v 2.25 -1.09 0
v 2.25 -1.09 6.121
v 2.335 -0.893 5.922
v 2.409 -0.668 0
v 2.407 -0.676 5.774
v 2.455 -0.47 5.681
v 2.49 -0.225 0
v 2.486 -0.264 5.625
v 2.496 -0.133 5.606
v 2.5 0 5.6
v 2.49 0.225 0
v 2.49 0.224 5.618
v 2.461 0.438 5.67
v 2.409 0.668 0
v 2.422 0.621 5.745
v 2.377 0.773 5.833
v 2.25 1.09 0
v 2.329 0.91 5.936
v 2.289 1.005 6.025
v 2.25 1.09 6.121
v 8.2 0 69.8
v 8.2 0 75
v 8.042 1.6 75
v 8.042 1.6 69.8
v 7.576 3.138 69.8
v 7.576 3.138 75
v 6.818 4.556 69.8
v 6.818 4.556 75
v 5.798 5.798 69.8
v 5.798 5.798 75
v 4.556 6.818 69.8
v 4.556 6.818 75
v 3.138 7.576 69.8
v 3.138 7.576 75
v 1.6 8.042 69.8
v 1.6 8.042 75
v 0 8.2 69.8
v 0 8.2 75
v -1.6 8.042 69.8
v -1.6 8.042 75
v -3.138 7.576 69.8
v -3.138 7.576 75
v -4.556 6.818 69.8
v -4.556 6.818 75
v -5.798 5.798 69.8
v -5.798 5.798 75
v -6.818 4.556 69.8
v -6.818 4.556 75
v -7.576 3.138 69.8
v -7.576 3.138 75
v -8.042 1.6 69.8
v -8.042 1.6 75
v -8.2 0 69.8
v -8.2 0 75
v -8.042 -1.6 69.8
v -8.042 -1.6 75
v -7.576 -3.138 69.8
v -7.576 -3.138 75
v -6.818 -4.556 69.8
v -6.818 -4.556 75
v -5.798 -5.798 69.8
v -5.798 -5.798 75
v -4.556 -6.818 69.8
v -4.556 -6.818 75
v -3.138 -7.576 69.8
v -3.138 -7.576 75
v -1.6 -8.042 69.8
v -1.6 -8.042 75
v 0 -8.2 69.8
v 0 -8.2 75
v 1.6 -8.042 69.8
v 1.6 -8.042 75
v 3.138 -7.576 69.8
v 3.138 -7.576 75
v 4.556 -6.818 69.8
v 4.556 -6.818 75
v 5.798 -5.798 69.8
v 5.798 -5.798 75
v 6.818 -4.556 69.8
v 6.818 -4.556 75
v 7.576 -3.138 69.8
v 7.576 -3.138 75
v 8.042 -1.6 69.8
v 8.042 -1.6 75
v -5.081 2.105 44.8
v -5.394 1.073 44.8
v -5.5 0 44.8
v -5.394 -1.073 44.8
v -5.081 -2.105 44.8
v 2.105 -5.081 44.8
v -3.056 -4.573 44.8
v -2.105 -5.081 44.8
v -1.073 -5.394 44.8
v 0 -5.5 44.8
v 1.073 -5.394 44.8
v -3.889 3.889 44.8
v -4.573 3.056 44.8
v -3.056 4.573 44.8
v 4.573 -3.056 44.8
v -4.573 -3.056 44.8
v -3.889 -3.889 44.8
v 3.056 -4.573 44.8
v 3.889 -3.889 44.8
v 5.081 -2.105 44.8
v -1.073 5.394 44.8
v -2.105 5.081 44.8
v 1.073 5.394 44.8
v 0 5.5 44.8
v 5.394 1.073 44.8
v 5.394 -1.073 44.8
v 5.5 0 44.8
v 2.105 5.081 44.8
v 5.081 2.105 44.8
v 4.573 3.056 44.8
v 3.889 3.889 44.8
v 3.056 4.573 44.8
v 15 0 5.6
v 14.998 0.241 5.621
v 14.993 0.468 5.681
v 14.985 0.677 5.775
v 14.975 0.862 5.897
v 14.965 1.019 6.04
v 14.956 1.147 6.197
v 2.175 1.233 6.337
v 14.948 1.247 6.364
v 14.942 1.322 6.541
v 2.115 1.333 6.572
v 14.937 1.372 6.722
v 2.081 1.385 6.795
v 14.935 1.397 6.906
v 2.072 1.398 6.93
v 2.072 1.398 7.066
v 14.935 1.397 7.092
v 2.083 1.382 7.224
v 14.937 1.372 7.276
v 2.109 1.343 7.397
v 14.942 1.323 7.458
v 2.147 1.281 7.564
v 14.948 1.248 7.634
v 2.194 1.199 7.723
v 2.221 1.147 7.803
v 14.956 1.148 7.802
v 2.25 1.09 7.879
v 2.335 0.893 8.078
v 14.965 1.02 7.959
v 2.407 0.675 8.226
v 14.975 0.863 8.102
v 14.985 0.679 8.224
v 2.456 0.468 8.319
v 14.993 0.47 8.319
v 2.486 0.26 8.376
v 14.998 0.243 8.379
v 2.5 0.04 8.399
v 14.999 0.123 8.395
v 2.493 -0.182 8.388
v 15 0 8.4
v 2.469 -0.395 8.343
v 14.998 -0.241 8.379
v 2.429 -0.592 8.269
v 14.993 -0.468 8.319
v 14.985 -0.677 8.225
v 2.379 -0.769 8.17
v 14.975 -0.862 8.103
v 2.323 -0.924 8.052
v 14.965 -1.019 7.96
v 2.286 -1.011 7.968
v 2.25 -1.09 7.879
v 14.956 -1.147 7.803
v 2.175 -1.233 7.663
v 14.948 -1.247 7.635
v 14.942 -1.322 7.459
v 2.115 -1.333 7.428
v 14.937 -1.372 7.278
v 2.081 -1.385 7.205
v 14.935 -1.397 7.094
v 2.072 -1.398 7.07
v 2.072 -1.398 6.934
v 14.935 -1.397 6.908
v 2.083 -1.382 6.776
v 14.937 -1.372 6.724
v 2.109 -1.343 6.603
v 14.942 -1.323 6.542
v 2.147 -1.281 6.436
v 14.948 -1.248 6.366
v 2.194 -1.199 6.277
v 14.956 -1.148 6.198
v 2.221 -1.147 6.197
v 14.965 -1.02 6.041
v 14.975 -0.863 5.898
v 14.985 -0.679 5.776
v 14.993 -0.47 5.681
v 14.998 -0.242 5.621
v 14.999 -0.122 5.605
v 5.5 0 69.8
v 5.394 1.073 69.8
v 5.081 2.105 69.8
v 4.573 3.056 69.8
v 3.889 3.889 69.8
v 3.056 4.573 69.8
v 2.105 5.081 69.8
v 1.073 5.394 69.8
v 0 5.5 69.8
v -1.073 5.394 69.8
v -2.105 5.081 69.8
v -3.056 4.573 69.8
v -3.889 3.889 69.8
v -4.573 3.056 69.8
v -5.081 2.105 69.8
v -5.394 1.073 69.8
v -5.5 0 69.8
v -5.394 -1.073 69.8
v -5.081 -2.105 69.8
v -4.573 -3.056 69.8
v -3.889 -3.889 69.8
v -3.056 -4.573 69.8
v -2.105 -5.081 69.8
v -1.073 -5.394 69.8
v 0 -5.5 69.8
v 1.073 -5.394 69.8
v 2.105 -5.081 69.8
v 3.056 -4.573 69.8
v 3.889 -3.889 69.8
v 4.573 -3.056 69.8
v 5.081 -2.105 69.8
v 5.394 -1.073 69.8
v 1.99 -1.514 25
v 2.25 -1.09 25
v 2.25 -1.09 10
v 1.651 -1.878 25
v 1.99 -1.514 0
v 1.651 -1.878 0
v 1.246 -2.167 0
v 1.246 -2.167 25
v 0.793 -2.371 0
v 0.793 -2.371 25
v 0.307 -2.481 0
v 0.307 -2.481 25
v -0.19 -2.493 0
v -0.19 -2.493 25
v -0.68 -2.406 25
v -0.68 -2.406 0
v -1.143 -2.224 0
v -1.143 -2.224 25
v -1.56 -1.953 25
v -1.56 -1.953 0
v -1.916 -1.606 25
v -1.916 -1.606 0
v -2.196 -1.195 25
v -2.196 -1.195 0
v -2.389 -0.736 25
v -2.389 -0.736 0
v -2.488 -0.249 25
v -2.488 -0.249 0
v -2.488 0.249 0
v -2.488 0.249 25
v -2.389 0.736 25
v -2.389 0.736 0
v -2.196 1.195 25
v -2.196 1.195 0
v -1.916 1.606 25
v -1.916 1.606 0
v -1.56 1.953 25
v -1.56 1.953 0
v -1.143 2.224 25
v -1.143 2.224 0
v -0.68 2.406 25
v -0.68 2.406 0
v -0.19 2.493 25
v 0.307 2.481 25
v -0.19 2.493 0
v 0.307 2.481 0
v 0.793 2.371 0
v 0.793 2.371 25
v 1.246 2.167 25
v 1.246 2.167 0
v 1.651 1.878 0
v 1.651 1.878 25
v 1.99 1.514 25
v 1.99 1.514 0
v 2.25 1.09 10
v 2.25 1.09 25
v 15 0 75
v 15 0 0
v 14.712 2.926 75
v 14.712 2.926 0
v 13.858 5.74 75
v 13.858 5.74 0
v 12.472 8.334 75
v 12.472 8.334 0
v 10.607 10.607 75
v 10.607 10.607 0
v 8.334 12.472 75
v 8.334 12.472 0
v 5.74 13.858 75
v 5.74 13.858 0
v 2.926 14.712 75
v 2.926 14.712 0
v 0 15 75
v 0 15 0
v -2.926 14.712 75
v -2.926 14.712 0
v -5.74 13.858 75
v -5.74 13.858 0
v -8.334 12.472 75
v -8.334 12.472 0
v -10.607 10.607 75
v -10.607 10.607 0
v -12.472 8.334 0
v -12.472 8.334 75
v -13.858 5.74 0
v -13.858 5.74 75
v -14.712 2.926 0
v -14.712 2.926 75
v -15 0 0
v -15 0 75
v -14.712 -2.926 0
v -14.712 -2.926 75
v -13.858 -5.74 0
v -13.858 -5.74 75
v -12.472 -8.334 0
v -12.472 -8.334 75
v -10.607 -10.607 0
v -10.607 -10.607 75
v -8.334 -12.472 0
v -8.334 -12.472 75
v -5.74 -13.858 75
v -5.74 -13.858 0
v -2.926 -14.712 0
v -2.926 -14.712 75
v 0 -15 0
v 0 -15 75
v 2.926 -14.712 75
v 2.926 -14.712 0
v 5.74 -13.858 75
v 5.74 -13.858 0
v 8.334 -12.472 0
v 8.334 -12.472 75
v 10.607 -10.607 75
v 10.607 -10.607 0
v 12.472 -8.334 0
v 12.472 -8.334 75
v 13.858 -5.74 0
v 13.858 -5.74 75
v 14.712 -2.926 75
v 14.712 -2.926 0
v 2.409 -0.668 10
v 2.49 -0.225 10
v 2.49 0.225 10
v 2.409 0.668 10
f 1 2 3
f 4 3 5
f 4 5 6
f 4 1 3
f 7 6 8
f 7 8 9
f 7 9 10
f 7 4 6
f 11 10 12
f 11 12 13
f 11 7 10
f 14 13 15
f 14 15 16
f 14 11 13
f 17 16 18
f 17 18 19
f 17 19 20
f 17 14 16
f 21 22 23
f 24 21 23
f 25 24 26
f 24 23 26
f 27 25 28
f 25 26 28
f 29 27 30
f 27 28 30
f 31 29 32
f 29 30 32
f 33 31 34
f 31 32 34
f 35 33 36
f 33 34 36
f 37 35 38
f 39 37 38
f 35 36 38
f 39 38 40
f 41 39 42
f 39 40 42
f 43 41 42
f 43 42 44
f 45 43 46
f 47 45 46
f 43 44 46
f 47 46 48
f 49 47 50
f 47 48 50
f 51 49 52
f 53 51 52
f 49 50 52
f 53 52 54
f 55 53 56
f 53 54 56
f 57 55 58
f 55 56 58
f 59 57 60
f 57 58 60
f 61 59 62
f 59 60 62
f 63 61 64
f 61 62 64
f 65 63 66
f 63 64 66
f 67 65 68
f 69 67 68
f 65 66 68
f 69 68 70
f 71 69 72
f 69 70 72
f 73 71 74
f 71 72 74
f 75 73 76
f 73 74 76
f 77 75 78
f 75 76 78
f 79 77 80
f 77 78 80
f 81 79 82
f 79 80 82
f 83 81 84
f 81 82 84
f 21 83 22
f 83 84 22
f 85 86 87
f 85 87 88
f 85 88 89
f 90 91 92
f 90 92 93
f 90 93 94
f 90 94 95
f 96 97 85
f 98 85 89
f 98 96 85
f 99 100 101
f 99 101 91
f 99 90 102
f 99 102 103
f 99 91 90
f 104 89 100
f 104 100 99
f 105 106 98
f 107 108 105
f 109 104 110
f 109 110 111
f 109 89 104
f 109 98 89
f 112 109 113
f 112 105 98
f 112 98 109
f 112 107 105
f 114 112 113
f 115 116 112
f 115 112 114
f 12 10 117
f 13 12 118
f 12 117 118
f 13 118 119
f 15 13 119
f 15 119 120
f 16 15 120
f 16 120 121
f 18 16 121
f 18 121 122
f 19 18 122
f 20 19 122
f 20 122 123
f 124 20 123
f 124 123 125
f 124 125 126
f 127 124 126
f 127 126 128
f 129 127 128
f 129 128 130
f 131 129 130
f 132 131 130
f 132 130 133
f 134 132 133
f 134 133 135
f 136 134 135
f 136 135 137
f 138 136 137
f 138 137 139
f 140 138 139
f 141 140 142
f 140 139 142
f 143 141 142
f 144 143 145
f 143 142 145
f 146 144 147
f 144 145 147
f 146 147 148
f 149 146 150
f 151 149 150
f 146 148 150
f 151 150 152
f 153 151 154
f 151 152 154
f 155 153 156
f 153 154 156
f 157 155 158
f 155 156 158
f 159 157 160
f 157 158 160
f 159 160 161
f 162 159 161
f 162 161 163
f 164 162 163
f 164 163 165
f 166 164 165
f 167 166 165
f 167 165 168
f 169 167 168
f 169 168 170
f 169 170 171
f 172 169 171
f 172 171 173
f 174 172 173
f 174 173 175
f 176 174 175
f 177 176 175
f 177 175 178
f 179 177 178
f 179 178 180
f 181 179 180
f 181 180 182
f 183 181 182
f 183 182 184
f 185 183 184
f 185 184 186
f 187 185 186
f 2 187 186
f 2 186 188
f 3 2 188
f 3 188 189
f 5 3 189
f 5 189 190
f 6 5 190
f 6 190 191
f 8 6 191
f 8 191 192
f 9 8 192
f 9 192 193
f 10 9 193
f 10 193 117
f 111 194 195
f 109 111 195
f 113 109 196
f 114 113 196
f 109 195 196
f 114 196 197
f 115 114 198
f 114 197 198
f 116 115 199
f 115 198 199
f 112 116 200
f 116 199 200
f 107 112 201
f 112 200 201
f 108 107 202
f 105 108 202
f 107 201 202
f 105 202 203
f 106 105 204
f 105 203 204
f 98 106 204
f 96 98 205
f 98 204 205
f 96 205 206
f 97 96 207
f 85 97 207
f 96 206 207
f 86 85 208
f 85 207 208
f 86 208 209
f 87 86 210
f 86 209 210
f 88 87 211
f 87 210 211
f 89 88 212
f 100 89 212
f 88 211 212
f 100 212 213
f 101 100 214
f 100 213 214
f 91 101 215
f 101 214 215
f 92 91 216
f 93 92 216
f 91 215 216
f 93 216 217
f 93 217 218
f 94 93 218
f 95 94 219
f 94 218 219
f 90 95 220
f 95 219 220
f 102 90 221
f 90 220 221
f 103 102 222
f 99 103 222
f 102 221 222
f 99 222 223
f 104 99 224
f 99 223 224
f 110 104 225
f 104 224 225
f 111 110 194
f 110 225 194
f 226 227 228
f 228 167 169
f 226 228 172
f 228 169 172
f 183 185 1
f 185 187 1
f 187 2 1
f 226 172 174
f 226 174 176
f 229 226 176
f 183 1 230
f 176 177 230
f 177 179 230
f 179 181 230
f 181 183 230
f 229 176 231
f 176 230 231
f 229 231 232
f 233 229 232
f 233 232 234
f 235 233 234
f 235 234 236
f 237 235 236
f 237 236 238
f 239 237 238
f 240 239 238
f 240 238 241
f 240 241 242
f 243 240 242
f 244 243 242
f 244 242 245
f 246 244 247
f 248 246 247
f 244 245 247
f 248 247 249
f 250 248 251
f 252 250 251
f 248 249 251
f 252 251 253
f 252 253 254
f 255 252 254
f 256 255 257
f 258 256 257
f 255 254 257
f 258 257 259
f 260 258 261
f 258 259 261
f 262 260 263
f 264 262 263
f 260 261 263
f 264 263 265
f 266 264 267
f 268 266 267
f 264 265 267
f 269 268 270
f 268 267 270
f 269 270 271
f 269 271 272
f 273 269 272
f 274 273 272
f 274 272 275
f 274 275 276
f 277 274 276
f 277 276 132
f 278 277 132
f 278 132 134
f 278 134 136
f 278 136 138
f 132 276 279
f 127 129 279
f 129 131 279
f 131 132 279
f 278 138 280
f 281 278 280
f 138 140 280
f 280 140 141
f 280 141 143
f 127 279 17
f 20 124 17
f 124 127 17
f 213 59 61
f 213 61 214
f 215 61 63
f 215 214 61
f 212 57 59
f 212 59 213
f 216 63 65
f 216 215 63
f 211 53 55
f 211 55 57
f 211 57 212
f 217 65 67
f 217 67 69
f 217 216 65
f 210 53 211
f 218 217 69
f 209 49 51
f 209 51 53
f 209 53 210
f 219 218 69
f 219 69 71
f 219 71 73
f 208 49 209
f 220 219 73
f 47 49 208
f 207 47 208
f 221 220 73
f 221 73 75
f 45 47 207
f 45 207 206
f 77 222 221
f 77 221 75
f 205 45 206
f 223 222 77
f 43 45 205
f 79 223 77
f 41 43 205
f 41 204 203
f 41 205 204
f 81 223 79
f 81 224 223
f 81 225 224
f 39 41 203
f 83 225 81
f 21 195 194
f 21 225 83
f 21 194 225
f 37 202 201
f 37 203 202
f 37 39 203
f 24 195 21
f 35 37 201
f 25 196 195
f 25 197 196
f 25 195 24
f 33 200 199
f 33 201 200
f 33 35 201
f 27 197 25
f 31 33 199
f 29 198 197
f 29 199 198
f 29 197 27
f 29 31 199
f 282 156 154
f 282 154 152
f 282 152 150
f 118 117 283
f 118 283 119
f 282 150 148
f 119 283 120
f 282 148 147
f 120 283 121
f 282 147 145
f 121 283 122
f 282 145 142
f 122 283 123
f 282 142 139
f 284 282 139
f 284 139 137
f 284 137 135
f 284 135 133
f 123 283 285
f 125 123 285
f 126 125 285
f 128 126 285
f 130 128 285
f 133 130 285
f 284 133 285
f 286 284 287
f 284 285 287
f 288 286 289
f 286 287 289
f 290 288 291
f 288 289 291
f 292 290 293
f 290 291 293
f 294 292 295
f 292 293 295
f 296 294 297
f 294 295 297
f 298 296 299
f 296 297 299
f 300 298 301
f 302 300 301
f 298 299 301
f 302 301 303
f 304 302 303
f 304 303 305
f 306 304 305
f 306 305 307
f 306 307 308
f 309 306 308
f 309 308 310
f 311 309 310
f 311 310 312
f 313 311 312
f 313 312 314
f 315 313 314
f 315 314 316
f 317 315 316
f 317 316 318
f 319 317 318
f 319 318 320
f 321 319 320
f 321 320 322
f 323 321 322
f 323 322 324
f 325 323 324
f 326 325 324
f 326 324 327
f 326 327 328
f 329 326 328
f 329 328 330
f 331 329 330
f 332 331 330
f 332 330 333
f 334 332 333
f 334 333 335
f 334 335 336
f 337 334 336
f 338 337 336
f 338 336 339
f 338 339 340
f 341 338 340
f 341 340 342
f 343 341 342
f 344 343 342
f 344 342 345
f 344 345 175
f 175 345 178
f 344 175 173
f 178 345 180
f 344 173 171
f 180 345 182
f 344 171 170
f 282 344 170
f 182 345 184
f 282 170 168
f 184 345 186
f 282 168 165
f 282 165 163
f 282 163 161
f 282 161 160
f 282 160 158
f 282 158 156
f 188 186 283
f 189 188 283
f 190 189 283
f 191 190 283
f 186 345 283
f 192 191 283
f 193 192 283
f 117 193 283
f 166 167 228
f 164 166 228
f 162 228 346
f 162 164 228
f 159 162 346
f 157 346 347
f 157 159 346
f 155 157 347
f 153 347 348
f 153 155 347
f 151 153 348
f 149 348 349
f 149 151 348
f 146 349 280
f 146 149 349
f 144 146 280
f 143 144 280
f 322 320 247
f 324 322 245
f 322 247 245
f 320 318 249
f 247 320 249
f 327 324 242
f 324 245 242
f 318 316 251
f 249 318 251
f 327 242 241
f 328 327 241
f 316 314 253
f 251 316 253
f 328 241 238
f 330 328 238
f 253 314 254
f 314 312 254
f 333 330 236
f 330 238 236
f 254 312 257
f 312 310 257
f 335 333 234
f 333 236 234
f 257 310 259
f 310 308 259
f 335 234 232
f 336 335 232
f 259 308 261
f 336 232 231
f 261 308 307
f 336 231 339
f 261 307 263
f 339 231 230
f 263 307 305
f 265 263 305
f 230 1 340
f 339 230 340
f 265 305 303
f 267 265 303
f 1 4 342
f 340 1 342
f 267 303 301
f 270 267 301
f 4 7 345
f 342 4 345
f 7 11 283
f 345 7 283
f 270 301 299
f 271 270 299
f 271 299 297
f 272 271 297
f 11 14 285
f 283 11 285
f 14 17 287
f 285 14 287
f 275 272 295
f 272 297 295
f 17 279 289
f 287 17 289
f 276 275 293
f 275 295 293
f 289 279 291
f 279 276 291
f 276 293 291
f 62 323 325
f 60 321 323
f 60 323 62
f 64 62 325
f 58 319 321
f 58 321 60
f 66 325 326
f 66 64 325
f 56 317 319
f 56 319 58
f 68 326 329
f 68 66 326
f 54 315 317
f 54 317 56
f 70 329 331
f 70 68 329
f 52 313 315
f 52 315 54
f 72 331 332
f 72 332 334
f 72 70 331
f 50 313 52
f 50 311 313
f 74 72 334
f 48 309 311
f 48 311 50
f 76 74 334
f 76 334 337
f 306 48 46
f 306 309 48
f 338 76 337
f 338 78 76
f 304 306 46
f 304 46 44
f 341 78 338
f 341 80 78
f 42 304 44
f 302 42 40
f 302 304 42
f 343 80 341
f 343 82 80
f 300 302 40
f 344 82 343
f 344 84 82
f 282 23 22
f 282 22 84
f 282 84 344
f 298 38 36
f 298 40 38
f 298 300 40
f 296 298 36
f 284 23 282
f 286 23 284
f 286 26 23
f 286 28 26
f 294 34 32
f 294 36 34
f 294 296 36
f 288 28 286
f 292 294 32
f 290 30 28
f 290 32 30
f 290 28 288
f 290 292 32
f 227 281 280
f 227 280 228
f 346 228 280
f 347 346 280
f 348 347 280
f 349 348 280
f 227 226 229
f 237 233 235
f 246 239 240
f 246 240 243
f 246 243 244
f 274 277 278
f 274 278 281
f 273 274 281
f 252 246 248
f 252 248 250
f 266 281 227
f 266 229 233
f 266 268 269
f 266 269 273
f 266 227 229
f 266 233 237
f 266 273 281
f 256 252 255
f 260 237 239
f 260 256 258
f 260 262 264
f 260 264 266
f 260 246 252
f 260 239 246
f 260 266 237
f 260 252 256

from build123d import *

# Parameters (mm, degrees)
SKETCH1_R           = 15
BOSS_EXTRUDE1_DEPTH = 75
SKETCH2_R           = 8.2
CUT_EXTRUDE1_DEPTH  = 5.2
CUT_EXTRUDE2_DEPTH  = 25
SKETCH5_R           = 1.4
CUT_EXTRUDE4_DEPTH  = 14
SKETCH6_R           = 5.5
CUT_EXTRUDE5_DEPTH  = 25
CUT_EXTRUDE6_DEPTH  = 10


with BuildPart() as part:
    # Sketch1 → Boss-Extrude1 (new body)
    with BuildSketch(Plane.XY):
        Circle(SKETCH1_R)
    extrude(amount=BOSS_EXTRUDE1_DEPTH)

    # Sketch2 → Cut-Extrude1 (cut)
    with BuildSketch(Plane.XY.offset(75)):
        Circle(SKETCH2_R)
    extrude(amount=-CUT_EXTRUDE1_DEPTH, mode=Mode.SUBTRACT)

    # Sketch3 → Cut-Extrude2 (cut)
    with BuildSketch(Plane(origin=(0, 0, 0), x_dir=(-1, 0, 0), z_dir=(0, 0, -1))):
        with BuildLine():
            Line((-2.25, 1.089724736), (-2.25, -1.089724736))
            ThreePointArc((-2.25, -1.089724736), (2.5, 0), (-2.25, 1.089724736))
        make_face()
    extrude(amount=-CUT_EXTRUDE2_DEPTH, mode=Mode.SUBTRACT)

    # Sketch5 → Cut-Extrude4 (cut)
    with BuildSketch(Plane(origin=(15, 0, 0), x_dir=(0, 0, -1), z_dir=(1, 0, 0))):
        with Locations((-7, 0)):
            Circle(SKETCH5_R)
    extrude(amount=-CUT_EXTRUDE4_DEPTH, mode=Mode.SUBTRACT)

    # Sketch6 → Cut-Extrude5 (cut)
    with BuildSketch(Plane.XY.offset(69.8)):
        Circle(SKETCH6_R)
    extrude(amount=-CUT_EXTRUDE5_DEPTH, mode=Mode.SUBTRACT)

    # Sketch8 → Cut-Extrude6 (cut)
    with BuildSketch(Plane(origin=(0, 0, 0), x_dir=(-1, 0, 0), z_dir=(0, 0, -1))):
        with BuildLine():
            Line((-2.25, 1.089724736), (-2.25, -1.089724736))
            ThreePointArc((-2.25, -1.089724736), (-2.5, 0), (-2.25, 1.089724736))
        make_face()
    extrude(amount=-CUT_EXTRUDE6_DEPTH, mode=Mode.SUBTRACT)


solid = part.part
